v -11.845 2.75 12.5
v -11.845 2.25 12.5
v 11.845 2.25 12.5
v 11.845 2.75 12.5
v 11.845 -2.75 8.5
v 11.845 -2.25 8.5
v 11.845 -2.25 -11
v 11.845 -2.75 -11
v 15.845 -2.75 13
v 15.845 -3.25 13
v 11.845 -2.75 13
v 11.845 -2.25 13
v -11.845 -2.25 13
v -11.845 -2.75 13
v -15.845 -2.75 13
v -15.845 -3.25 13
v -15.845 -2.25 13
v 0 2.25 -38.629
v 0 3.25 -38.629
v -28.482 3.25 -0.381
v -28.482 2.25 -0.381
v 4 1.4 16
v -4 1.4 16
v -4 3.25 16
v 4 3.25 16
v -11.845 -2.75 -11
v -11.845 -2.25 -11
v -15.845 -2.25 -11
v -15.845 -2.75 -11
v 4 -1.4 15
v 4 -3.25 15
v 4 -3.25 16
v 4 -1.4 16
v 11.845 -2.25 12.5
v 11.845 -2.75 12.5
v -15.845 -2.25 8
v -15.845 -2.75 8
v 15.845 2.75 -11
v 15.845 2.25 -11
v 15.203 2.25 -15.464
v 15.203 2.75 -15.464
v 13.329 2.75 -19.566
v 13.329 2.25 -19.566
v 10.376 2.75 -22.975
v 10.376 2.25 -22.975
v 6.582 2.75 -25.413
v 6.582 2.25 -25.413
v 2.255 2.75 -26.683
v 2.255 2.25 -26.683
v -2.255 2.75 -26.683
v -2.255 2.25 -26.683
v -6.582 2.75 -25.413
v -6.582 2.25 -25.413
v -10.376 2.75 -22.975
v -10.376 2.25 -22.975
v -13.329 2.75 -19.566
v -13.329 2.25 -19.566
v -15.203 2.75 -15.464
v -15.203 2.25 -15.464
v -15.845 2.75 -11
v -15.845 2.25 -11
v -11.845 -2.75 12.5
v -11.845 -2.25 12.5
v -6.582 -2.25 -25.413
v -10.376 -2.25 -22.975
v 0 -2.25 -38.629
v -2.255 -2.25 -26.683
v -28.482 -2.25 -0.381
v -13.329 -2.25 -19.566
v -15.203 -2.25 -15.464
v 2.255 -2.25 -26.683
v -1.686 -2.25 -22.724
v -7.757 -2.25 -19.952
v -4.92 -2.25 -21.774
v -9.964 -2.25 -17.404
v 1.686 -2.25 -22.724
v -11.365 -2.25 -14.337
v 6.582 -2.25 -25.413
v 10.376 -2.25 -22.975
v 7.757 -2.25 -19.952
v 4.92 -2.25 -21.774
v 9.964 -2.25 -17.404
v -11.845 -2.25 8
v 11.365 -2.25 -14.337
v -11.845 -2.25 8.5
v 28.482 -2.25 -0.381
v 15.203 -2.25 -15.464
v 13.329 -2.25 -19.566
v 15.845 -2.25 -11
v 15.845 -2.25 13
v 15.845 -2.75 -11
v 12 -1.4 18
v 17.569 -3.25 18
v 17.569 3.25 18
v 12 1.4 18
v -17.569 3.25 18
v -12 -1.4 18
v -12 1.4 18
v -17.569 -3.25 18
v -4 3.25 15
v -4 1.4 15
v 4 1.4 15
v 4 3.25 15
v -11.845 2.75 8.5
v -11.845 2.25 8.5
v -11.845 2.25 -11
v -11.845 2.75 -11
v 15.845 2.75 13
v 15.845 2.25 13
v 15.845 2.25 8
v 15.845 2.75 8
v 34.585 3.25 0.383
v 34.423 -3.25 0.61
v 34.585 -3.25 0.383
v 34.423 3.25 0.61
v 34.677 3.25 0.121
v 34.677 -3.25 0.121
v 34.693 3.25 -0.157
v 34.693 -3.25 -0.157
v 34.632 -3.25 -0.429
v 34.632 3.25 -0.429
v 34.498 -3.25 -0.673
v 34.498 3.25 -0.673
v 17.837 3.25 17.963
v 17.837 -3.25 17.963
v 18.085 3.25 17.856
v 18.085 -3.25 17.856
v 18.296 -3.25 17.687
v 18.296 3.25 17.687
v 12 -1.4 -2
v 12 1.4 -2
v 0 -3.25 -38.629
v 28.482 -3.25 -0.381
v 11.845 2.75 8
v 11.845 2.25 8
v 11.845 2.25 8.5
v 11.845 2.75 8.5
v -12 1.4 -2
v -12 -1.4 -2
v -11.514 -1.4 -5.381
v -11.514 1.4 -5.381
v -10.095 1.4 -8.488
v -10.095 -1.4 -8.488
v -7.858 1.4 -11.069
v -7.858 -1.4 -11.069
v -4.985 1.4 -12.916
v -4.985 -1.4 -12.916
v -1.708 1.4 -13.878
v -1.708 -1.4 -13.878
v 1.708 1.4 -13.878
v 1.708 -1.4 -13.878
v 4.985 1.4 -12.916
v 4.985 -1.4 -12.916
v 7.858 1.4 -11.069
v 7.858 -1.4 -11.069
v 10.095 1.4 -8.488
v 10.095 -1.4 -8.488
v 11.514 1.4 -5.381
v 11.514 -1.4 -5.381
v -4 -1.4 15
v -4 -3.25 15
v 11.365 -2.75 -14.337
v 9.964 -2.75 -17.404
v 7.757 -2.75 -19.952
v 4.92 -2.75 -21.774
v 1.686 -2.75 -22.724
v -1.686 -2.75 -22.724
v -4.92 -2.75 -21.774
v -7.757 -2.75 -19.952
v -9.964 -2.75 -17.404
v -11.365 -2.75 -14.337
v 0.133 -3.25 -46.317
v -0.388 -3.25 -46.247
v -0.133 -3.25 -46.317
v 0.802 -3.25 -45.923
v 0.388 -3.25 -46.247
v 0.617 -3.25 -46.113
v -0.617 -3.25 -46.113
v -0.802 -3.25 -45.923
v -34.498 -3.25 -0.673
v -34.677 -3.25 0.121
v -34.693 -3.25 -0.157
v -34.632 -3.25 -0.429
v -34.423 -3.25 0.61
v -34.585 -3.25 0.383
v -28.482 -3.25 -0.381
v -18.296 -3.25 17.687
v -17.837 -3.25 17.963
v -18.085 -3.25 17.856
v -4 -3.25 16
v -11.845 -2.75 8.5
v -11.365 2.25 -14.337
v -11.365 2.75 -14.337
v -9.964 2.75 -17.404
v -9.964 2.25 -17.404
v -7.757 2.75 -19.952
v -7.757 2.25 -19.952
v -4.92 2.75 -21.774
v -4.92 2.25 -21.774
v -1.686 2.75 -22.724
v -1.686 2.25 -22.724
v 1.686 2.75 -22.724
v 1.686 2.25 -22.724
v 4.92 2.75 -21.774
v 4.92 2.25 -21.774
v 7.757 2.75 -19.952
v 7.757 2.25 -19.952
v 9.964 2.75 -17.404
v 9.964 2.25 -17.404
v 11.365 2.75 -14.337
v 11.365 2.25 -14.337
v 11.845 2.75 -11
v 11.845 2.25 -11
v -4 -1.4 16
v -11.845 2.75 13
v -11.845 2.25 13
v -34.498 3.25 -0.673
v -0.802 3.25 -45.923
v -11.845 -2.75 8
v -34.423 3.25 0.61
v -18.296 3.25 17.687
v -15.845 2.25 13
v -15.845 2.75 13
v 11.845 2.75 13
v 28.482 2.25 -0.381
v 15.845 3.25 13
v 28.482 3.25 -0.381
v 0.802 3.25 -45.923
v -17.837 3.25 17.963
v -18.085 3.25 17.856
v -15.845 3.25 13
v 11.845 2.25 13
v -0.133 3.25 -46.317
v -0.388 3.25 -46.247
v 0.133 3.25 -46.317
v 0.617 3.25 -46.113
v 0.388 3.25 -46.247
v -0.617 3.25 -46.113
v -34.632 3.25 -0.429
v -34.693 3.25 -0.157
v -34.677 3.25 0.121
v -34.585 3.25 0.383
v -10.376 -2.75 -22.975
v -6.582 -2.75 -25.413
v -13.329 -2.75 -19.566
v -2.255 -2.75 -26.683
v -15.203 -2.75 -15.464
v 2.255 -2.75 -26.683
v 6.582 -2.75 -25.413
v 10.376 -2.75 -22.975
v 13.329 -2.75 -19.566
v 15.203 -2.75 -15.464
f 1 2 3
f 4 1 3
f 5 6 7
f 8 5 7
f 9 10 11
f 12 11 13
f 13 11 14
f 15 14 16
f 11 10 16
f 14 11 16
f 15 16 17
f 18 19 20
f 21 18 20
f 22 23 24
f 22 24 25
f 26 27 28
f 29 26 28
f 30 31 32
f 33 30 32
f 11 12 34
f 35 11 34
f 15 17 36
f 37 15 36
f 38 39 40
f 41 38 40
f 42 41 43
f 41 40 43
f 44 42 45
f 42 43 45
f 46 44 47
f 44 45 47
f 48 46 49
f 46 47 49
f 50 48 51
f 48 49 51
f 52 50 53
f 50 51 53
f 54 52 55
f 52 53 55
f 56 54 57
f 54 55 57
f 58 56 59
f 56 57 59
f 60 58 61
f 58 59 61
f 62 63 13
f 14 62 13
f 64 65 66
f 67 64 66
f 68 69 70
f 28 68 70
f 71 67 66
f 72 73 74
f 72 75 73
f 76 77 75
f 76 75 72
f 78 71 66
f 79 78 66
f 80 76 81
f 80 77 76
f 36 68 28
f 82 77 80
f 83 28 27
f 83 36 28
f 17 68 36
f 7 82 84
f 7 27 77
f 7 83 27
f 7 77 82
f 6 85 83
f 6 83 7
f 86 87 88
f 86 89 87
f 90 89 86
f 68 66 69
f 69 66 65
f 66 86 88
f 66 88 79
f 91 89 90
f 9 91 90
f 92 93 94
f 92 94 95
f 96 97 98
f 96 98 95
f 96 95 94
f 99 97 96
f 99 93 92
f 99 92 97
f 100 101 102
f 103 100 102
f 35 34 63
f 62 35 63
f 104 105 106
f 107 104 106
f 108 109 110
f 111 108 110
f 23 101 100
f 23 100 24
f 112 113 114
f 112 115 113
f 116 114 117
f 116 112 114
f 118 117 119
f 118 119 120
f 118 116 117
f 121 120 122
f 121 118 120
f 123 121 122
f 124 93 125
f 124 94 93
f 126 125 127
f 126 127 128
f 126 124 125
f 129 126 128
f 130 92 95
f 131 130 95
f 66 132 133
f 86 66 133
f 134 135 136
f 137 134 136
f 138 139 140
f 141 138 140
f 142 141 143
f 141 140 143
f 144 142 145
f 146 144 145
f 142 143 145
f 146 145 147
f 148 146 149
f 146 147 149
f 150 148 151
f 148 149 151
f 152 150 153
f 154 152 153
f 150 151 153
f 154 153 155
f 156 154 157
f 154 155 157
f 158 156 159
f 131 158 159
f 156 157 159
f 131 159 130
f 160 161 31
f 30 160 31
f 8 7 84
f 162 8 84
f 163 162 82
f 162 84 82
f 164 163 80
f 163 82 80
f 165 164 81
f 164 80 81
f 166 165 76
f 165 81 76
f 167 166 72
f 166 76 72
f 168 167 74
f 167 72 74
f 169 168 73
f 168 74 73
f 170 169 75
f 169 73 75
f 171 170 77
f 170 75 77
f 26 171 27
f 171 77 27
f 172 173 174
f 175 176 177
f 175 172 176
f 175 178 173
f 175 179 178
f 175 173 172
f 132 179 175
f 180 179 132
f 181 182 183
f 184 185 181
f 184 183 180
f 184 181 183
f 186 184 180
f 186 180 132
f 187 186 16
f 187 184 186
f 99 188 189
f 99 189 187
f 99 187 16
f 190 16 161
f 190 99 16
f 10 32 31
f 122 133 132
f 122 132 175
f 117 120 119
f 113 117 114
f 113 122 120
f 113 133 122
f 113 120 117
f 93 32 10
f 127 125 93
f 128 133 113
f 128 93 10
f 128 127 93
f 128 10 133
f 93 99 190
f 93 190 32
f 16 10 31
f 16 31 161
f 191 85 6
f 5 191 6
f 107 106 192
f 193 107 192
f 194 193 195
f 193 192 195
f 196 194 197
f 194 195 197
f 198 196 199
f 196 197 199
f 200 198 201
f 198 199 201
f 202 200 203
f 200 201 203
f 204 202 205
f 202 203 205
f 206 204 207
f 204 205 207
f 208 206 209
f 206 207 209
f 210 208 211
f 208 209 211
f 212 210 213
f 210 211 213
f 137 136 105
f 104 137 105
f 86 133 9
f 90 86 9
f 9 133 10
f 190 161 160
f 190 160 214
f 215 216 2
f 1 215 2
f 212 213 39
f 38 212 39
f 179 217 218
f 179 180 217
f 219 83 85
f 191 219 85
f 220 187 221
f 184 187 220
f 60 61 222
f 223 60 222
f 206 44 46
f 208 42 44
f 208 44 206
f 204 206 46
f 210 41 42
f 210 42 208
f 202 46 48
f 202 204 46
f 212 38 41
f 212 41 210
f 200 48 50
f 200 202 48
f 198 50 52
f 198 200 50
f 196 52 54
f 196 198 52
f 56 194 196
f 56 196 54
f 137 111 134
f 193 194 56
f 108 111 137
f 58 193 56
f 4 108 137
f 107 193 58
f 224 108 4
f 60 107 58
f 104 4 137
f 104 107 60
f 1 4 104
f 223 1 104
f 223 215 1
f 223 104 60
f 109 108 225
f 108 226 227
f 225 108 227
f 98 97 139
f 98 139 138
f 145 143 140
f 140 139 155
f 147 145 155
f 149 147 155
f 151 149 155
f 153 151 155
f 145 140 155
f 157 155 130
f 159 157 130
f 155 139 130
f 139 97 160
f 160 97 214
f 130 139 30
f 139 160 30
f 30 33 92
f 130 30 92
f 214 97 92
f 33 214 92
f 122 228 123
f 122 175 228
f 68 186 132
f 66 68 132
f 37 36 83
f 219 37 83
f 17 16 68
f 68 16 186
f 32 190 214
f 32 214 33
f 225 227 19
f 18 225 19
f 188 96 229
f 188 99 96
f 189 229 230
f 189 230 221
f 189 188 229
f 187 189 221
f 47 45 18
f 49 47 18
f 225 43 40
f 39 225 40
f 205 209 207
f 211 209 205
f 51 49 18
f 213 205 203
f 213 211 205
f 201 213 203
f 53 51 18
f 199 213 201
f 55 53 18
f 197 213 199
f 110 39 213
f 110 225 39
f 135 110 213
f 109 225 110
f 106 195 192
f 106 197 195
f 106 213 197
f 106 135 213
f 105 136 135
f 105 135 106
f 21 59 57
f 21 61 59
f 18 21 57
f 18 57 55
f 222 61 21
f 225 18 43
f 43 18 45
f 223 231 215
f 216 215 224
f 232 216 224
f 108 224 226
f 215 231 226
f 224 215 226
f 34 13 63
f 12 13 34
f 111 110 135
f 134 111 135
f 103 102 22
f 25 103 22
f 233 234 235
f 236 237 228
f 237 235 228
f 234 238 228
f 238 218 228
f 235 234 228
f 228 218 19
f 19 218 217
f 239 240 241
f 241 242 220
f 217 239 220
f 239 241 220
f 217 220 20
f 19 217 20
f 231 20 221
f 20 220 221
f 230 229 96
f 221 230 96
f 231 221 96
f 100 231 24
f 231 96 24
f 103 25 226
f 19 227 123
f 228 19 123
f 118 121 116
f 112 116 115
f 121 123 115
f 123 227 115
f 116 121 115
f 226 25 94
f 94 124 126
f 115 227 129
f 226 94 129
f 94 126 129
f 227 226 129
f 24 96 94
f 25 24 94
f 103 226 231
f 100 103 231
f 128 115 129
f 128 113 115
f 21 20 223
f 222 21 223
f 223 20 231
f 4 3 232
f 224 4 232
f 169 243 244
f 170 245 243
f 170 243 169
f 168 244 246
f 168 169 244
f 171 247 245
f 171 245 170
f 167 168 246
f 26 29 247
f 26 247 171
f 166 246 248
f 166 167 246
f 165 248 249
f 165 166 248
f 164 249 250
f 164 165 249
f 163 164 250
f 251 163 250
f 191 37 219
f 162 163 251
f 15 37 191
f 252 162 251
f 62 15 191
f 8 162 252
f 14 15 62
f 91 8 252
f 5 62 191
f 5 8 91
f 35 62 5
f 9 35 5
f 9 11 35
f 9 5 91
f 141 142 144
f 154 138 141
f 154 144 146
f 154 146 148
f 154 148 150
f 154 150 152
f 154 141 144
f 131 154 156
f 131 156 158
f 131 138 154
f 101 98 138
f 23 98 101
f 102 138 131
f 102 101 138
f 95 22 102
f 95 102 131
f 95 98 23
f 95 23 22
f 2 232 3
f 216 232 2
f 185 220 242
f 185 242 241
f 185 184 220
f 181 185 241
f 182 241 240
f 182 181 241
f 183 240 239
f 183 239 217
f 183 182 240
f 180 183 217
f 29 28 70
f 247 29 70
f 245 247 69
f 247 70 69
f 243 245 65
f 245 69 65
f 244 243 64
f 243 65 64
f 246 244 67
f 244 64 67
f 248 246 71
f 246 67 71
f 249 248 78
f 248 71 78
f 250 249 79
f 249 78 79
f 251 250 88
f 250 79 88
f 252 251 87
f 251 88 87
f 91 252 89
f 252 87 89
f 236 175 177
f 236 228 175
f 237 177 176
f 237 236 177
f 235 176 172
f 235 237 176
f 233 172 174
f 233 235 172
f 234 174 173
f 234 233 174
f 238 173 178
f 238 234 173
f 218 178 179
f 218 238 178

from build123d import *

# Parameters (mm, degrees)
F1_DEPTH  = 3.25
F3_DEPTH  = 1
F5_DEPTH  = 1
F7_DEPTH  = 0.5
F9_DEPTH  = 0.5
F10_W     = 24
F10_H     = 2.8
F11_DEPTH = 20
F13_DEPTH = 1.4
F14_W     = 8
F14_H     = 1
F15_DEPTH = 25
F16_R     = 1


with BuildPart() as f1:
    # F0 (on Front) → F1 (new body, symmetric)
    with BuildSketch(Plane.XZ):
        Polygon((18, 18), (0, 18), (-18, 18), (-35, 0), (0, -47), (35, 0), align=None)
    extrude(amount=F1_DEPTH, both=True)

    # F2 (on face) → F3 (cut)
    with BuildSketch(Plane.XZ.offset(3.25)):
        Polygon((15.844768, 13), (-15.844768, 13), (-28.482277, -0.380893), (0, -38.628523), (28.482278, -0.380893), align=None)
    extrude(amount=-F3_DEPTH, mode=Mode.SUBTRACT)

    # F4 (on face) → F5 (cut)
    with BuildSketch(Plane(origin=(0, 3.25, 0), x_dir=(-1, 0, 0), z_dir=(0, 1, 0))):
        Polygon((28.482278, -0.380893), (15.844768, 13), (-15.844767, 13), (-28.482277, -0.380893), (0, -38.628522), align=None)
    extrude(amount=-F5_DEPTH, mode=Mode.SUBTRACT)

    # F6 (on face) → F7 (join)
    with BuildSketch(Plane(origin=(0, 2.25, 0), x_dir=(-1, 0, 0), z_dir=(0, 1, 0))):
        with BuildLine():
            Line((15.844768, 13), (11.844768, 13))
            Line((11.844768, 13), (11.844768, 12.5))
            Line((11.844768, 12.5), (-11.844768, 12.5))
            Line((-11.844768, 12.5), (-11.844768, 13))
            Line((-11.844768, 13), (-15.844768, 13))
            Line((-15.844768, 13), (-15.844768, 8))
            Line((-15.844768, 8), (-11.844768, 8))
            Line((-11.844768, 8), (-11.844768, 8.5))
            Line((-11.844768, 8.5), (11.844768, 8.5))
            Line((11.844768, 8.5), (11.844768, -11))
            ThreePointArc((11.844768, -11), (0, -22.844768), (-11.844768, -11))
            Line((-11.844768, -11), (-15.844768, -11))
            ThreePointArc((-15.844768, -11), (0, -26.844768), (15.844768, -11))
            Line((15.844768, -11), (15.844768, 13))
        make_face()
    extrude(amount=F7_DEPTH)

    # F8 (on face) → F9 (join)
    with BuildSketch(Plane.XZ.offset(2.25)):
        with BuildLine():
            Line((15.844768, 13), (11.844768, 13))
            Line((11.844768, 13), (11.844768, 12.500001))
            Line((11.844768, 12.500001), (-11.844767, 12.500001))
            Line((-11.844767, 12.500001), (-11.844767, 13))
            Line((-11.844767, 13), (-15.844767, 13))
            Line((-15.844767, 13), (-15.844767, 8.000001))
            Line((-15.844767, 8.000001), (-11.844767, 8.000001))
            Line((-11.844767, 8.000001), (-11.844767, 8.500001))
            Line((-11.844767, 8.500001), (11.844768, 8.500001))
            Line((11.844768, 8.500001), (11.844768, -11))
            ThreePointArc((11.844768, -11), (0, -22.844767), (-11.844767, -11))
            Line((-11.844767, -11), (-15.844767, -11))
            ThreePointArc((-15.844767, -11), (0, -26.844767), (15.844768, -11))
            Line((15.844768, -11), (15.844768, 13))
        make_face()
    extrude(amount=F9_DEPTH)

    # F10 (on face) → F11 (cut)
    with BuildSketch(Plane.XY.offset(18)):
        Rectangle(F10_W, F10_H)
    extrude(amount=-F11_DEPTH, mode=Mode.SUBTRACT)

    # F12 (on Front) → F13 (cut, symmetric)
    with BuildSketch(Plane.XZ):
        with BuildLine():
            Line((12, -2), (-12, -2))
            ThreePointArc((-12, -2), (0, -14), (12, -2))
        make_face()
    extrude(amount=F13_DEPTH, both=True, mode=Mode.SUBTRACT)

    # F14 (on face) → F15 (cut)
    with BuildSketch(Plane.XZ.offset(3.25)):
        with Locations((0, 15.5)):
            Rectangle(F14_W, F14_H)
    extrude(amount=-F15_DEPTH, mode=Mode.SUBTRACT)

    # F16
    f16_edges = [f1.edges().sort_by_distance(p)[0] for p in [
        (0, 0, -47),
        (35, 0, 0),
        (-35, 0, 0),
        (-18, 0, 18),
        (18, 0, 18),
    ]]
    fillet(f16_edges, radius=F16_R)


solid = f1.part
